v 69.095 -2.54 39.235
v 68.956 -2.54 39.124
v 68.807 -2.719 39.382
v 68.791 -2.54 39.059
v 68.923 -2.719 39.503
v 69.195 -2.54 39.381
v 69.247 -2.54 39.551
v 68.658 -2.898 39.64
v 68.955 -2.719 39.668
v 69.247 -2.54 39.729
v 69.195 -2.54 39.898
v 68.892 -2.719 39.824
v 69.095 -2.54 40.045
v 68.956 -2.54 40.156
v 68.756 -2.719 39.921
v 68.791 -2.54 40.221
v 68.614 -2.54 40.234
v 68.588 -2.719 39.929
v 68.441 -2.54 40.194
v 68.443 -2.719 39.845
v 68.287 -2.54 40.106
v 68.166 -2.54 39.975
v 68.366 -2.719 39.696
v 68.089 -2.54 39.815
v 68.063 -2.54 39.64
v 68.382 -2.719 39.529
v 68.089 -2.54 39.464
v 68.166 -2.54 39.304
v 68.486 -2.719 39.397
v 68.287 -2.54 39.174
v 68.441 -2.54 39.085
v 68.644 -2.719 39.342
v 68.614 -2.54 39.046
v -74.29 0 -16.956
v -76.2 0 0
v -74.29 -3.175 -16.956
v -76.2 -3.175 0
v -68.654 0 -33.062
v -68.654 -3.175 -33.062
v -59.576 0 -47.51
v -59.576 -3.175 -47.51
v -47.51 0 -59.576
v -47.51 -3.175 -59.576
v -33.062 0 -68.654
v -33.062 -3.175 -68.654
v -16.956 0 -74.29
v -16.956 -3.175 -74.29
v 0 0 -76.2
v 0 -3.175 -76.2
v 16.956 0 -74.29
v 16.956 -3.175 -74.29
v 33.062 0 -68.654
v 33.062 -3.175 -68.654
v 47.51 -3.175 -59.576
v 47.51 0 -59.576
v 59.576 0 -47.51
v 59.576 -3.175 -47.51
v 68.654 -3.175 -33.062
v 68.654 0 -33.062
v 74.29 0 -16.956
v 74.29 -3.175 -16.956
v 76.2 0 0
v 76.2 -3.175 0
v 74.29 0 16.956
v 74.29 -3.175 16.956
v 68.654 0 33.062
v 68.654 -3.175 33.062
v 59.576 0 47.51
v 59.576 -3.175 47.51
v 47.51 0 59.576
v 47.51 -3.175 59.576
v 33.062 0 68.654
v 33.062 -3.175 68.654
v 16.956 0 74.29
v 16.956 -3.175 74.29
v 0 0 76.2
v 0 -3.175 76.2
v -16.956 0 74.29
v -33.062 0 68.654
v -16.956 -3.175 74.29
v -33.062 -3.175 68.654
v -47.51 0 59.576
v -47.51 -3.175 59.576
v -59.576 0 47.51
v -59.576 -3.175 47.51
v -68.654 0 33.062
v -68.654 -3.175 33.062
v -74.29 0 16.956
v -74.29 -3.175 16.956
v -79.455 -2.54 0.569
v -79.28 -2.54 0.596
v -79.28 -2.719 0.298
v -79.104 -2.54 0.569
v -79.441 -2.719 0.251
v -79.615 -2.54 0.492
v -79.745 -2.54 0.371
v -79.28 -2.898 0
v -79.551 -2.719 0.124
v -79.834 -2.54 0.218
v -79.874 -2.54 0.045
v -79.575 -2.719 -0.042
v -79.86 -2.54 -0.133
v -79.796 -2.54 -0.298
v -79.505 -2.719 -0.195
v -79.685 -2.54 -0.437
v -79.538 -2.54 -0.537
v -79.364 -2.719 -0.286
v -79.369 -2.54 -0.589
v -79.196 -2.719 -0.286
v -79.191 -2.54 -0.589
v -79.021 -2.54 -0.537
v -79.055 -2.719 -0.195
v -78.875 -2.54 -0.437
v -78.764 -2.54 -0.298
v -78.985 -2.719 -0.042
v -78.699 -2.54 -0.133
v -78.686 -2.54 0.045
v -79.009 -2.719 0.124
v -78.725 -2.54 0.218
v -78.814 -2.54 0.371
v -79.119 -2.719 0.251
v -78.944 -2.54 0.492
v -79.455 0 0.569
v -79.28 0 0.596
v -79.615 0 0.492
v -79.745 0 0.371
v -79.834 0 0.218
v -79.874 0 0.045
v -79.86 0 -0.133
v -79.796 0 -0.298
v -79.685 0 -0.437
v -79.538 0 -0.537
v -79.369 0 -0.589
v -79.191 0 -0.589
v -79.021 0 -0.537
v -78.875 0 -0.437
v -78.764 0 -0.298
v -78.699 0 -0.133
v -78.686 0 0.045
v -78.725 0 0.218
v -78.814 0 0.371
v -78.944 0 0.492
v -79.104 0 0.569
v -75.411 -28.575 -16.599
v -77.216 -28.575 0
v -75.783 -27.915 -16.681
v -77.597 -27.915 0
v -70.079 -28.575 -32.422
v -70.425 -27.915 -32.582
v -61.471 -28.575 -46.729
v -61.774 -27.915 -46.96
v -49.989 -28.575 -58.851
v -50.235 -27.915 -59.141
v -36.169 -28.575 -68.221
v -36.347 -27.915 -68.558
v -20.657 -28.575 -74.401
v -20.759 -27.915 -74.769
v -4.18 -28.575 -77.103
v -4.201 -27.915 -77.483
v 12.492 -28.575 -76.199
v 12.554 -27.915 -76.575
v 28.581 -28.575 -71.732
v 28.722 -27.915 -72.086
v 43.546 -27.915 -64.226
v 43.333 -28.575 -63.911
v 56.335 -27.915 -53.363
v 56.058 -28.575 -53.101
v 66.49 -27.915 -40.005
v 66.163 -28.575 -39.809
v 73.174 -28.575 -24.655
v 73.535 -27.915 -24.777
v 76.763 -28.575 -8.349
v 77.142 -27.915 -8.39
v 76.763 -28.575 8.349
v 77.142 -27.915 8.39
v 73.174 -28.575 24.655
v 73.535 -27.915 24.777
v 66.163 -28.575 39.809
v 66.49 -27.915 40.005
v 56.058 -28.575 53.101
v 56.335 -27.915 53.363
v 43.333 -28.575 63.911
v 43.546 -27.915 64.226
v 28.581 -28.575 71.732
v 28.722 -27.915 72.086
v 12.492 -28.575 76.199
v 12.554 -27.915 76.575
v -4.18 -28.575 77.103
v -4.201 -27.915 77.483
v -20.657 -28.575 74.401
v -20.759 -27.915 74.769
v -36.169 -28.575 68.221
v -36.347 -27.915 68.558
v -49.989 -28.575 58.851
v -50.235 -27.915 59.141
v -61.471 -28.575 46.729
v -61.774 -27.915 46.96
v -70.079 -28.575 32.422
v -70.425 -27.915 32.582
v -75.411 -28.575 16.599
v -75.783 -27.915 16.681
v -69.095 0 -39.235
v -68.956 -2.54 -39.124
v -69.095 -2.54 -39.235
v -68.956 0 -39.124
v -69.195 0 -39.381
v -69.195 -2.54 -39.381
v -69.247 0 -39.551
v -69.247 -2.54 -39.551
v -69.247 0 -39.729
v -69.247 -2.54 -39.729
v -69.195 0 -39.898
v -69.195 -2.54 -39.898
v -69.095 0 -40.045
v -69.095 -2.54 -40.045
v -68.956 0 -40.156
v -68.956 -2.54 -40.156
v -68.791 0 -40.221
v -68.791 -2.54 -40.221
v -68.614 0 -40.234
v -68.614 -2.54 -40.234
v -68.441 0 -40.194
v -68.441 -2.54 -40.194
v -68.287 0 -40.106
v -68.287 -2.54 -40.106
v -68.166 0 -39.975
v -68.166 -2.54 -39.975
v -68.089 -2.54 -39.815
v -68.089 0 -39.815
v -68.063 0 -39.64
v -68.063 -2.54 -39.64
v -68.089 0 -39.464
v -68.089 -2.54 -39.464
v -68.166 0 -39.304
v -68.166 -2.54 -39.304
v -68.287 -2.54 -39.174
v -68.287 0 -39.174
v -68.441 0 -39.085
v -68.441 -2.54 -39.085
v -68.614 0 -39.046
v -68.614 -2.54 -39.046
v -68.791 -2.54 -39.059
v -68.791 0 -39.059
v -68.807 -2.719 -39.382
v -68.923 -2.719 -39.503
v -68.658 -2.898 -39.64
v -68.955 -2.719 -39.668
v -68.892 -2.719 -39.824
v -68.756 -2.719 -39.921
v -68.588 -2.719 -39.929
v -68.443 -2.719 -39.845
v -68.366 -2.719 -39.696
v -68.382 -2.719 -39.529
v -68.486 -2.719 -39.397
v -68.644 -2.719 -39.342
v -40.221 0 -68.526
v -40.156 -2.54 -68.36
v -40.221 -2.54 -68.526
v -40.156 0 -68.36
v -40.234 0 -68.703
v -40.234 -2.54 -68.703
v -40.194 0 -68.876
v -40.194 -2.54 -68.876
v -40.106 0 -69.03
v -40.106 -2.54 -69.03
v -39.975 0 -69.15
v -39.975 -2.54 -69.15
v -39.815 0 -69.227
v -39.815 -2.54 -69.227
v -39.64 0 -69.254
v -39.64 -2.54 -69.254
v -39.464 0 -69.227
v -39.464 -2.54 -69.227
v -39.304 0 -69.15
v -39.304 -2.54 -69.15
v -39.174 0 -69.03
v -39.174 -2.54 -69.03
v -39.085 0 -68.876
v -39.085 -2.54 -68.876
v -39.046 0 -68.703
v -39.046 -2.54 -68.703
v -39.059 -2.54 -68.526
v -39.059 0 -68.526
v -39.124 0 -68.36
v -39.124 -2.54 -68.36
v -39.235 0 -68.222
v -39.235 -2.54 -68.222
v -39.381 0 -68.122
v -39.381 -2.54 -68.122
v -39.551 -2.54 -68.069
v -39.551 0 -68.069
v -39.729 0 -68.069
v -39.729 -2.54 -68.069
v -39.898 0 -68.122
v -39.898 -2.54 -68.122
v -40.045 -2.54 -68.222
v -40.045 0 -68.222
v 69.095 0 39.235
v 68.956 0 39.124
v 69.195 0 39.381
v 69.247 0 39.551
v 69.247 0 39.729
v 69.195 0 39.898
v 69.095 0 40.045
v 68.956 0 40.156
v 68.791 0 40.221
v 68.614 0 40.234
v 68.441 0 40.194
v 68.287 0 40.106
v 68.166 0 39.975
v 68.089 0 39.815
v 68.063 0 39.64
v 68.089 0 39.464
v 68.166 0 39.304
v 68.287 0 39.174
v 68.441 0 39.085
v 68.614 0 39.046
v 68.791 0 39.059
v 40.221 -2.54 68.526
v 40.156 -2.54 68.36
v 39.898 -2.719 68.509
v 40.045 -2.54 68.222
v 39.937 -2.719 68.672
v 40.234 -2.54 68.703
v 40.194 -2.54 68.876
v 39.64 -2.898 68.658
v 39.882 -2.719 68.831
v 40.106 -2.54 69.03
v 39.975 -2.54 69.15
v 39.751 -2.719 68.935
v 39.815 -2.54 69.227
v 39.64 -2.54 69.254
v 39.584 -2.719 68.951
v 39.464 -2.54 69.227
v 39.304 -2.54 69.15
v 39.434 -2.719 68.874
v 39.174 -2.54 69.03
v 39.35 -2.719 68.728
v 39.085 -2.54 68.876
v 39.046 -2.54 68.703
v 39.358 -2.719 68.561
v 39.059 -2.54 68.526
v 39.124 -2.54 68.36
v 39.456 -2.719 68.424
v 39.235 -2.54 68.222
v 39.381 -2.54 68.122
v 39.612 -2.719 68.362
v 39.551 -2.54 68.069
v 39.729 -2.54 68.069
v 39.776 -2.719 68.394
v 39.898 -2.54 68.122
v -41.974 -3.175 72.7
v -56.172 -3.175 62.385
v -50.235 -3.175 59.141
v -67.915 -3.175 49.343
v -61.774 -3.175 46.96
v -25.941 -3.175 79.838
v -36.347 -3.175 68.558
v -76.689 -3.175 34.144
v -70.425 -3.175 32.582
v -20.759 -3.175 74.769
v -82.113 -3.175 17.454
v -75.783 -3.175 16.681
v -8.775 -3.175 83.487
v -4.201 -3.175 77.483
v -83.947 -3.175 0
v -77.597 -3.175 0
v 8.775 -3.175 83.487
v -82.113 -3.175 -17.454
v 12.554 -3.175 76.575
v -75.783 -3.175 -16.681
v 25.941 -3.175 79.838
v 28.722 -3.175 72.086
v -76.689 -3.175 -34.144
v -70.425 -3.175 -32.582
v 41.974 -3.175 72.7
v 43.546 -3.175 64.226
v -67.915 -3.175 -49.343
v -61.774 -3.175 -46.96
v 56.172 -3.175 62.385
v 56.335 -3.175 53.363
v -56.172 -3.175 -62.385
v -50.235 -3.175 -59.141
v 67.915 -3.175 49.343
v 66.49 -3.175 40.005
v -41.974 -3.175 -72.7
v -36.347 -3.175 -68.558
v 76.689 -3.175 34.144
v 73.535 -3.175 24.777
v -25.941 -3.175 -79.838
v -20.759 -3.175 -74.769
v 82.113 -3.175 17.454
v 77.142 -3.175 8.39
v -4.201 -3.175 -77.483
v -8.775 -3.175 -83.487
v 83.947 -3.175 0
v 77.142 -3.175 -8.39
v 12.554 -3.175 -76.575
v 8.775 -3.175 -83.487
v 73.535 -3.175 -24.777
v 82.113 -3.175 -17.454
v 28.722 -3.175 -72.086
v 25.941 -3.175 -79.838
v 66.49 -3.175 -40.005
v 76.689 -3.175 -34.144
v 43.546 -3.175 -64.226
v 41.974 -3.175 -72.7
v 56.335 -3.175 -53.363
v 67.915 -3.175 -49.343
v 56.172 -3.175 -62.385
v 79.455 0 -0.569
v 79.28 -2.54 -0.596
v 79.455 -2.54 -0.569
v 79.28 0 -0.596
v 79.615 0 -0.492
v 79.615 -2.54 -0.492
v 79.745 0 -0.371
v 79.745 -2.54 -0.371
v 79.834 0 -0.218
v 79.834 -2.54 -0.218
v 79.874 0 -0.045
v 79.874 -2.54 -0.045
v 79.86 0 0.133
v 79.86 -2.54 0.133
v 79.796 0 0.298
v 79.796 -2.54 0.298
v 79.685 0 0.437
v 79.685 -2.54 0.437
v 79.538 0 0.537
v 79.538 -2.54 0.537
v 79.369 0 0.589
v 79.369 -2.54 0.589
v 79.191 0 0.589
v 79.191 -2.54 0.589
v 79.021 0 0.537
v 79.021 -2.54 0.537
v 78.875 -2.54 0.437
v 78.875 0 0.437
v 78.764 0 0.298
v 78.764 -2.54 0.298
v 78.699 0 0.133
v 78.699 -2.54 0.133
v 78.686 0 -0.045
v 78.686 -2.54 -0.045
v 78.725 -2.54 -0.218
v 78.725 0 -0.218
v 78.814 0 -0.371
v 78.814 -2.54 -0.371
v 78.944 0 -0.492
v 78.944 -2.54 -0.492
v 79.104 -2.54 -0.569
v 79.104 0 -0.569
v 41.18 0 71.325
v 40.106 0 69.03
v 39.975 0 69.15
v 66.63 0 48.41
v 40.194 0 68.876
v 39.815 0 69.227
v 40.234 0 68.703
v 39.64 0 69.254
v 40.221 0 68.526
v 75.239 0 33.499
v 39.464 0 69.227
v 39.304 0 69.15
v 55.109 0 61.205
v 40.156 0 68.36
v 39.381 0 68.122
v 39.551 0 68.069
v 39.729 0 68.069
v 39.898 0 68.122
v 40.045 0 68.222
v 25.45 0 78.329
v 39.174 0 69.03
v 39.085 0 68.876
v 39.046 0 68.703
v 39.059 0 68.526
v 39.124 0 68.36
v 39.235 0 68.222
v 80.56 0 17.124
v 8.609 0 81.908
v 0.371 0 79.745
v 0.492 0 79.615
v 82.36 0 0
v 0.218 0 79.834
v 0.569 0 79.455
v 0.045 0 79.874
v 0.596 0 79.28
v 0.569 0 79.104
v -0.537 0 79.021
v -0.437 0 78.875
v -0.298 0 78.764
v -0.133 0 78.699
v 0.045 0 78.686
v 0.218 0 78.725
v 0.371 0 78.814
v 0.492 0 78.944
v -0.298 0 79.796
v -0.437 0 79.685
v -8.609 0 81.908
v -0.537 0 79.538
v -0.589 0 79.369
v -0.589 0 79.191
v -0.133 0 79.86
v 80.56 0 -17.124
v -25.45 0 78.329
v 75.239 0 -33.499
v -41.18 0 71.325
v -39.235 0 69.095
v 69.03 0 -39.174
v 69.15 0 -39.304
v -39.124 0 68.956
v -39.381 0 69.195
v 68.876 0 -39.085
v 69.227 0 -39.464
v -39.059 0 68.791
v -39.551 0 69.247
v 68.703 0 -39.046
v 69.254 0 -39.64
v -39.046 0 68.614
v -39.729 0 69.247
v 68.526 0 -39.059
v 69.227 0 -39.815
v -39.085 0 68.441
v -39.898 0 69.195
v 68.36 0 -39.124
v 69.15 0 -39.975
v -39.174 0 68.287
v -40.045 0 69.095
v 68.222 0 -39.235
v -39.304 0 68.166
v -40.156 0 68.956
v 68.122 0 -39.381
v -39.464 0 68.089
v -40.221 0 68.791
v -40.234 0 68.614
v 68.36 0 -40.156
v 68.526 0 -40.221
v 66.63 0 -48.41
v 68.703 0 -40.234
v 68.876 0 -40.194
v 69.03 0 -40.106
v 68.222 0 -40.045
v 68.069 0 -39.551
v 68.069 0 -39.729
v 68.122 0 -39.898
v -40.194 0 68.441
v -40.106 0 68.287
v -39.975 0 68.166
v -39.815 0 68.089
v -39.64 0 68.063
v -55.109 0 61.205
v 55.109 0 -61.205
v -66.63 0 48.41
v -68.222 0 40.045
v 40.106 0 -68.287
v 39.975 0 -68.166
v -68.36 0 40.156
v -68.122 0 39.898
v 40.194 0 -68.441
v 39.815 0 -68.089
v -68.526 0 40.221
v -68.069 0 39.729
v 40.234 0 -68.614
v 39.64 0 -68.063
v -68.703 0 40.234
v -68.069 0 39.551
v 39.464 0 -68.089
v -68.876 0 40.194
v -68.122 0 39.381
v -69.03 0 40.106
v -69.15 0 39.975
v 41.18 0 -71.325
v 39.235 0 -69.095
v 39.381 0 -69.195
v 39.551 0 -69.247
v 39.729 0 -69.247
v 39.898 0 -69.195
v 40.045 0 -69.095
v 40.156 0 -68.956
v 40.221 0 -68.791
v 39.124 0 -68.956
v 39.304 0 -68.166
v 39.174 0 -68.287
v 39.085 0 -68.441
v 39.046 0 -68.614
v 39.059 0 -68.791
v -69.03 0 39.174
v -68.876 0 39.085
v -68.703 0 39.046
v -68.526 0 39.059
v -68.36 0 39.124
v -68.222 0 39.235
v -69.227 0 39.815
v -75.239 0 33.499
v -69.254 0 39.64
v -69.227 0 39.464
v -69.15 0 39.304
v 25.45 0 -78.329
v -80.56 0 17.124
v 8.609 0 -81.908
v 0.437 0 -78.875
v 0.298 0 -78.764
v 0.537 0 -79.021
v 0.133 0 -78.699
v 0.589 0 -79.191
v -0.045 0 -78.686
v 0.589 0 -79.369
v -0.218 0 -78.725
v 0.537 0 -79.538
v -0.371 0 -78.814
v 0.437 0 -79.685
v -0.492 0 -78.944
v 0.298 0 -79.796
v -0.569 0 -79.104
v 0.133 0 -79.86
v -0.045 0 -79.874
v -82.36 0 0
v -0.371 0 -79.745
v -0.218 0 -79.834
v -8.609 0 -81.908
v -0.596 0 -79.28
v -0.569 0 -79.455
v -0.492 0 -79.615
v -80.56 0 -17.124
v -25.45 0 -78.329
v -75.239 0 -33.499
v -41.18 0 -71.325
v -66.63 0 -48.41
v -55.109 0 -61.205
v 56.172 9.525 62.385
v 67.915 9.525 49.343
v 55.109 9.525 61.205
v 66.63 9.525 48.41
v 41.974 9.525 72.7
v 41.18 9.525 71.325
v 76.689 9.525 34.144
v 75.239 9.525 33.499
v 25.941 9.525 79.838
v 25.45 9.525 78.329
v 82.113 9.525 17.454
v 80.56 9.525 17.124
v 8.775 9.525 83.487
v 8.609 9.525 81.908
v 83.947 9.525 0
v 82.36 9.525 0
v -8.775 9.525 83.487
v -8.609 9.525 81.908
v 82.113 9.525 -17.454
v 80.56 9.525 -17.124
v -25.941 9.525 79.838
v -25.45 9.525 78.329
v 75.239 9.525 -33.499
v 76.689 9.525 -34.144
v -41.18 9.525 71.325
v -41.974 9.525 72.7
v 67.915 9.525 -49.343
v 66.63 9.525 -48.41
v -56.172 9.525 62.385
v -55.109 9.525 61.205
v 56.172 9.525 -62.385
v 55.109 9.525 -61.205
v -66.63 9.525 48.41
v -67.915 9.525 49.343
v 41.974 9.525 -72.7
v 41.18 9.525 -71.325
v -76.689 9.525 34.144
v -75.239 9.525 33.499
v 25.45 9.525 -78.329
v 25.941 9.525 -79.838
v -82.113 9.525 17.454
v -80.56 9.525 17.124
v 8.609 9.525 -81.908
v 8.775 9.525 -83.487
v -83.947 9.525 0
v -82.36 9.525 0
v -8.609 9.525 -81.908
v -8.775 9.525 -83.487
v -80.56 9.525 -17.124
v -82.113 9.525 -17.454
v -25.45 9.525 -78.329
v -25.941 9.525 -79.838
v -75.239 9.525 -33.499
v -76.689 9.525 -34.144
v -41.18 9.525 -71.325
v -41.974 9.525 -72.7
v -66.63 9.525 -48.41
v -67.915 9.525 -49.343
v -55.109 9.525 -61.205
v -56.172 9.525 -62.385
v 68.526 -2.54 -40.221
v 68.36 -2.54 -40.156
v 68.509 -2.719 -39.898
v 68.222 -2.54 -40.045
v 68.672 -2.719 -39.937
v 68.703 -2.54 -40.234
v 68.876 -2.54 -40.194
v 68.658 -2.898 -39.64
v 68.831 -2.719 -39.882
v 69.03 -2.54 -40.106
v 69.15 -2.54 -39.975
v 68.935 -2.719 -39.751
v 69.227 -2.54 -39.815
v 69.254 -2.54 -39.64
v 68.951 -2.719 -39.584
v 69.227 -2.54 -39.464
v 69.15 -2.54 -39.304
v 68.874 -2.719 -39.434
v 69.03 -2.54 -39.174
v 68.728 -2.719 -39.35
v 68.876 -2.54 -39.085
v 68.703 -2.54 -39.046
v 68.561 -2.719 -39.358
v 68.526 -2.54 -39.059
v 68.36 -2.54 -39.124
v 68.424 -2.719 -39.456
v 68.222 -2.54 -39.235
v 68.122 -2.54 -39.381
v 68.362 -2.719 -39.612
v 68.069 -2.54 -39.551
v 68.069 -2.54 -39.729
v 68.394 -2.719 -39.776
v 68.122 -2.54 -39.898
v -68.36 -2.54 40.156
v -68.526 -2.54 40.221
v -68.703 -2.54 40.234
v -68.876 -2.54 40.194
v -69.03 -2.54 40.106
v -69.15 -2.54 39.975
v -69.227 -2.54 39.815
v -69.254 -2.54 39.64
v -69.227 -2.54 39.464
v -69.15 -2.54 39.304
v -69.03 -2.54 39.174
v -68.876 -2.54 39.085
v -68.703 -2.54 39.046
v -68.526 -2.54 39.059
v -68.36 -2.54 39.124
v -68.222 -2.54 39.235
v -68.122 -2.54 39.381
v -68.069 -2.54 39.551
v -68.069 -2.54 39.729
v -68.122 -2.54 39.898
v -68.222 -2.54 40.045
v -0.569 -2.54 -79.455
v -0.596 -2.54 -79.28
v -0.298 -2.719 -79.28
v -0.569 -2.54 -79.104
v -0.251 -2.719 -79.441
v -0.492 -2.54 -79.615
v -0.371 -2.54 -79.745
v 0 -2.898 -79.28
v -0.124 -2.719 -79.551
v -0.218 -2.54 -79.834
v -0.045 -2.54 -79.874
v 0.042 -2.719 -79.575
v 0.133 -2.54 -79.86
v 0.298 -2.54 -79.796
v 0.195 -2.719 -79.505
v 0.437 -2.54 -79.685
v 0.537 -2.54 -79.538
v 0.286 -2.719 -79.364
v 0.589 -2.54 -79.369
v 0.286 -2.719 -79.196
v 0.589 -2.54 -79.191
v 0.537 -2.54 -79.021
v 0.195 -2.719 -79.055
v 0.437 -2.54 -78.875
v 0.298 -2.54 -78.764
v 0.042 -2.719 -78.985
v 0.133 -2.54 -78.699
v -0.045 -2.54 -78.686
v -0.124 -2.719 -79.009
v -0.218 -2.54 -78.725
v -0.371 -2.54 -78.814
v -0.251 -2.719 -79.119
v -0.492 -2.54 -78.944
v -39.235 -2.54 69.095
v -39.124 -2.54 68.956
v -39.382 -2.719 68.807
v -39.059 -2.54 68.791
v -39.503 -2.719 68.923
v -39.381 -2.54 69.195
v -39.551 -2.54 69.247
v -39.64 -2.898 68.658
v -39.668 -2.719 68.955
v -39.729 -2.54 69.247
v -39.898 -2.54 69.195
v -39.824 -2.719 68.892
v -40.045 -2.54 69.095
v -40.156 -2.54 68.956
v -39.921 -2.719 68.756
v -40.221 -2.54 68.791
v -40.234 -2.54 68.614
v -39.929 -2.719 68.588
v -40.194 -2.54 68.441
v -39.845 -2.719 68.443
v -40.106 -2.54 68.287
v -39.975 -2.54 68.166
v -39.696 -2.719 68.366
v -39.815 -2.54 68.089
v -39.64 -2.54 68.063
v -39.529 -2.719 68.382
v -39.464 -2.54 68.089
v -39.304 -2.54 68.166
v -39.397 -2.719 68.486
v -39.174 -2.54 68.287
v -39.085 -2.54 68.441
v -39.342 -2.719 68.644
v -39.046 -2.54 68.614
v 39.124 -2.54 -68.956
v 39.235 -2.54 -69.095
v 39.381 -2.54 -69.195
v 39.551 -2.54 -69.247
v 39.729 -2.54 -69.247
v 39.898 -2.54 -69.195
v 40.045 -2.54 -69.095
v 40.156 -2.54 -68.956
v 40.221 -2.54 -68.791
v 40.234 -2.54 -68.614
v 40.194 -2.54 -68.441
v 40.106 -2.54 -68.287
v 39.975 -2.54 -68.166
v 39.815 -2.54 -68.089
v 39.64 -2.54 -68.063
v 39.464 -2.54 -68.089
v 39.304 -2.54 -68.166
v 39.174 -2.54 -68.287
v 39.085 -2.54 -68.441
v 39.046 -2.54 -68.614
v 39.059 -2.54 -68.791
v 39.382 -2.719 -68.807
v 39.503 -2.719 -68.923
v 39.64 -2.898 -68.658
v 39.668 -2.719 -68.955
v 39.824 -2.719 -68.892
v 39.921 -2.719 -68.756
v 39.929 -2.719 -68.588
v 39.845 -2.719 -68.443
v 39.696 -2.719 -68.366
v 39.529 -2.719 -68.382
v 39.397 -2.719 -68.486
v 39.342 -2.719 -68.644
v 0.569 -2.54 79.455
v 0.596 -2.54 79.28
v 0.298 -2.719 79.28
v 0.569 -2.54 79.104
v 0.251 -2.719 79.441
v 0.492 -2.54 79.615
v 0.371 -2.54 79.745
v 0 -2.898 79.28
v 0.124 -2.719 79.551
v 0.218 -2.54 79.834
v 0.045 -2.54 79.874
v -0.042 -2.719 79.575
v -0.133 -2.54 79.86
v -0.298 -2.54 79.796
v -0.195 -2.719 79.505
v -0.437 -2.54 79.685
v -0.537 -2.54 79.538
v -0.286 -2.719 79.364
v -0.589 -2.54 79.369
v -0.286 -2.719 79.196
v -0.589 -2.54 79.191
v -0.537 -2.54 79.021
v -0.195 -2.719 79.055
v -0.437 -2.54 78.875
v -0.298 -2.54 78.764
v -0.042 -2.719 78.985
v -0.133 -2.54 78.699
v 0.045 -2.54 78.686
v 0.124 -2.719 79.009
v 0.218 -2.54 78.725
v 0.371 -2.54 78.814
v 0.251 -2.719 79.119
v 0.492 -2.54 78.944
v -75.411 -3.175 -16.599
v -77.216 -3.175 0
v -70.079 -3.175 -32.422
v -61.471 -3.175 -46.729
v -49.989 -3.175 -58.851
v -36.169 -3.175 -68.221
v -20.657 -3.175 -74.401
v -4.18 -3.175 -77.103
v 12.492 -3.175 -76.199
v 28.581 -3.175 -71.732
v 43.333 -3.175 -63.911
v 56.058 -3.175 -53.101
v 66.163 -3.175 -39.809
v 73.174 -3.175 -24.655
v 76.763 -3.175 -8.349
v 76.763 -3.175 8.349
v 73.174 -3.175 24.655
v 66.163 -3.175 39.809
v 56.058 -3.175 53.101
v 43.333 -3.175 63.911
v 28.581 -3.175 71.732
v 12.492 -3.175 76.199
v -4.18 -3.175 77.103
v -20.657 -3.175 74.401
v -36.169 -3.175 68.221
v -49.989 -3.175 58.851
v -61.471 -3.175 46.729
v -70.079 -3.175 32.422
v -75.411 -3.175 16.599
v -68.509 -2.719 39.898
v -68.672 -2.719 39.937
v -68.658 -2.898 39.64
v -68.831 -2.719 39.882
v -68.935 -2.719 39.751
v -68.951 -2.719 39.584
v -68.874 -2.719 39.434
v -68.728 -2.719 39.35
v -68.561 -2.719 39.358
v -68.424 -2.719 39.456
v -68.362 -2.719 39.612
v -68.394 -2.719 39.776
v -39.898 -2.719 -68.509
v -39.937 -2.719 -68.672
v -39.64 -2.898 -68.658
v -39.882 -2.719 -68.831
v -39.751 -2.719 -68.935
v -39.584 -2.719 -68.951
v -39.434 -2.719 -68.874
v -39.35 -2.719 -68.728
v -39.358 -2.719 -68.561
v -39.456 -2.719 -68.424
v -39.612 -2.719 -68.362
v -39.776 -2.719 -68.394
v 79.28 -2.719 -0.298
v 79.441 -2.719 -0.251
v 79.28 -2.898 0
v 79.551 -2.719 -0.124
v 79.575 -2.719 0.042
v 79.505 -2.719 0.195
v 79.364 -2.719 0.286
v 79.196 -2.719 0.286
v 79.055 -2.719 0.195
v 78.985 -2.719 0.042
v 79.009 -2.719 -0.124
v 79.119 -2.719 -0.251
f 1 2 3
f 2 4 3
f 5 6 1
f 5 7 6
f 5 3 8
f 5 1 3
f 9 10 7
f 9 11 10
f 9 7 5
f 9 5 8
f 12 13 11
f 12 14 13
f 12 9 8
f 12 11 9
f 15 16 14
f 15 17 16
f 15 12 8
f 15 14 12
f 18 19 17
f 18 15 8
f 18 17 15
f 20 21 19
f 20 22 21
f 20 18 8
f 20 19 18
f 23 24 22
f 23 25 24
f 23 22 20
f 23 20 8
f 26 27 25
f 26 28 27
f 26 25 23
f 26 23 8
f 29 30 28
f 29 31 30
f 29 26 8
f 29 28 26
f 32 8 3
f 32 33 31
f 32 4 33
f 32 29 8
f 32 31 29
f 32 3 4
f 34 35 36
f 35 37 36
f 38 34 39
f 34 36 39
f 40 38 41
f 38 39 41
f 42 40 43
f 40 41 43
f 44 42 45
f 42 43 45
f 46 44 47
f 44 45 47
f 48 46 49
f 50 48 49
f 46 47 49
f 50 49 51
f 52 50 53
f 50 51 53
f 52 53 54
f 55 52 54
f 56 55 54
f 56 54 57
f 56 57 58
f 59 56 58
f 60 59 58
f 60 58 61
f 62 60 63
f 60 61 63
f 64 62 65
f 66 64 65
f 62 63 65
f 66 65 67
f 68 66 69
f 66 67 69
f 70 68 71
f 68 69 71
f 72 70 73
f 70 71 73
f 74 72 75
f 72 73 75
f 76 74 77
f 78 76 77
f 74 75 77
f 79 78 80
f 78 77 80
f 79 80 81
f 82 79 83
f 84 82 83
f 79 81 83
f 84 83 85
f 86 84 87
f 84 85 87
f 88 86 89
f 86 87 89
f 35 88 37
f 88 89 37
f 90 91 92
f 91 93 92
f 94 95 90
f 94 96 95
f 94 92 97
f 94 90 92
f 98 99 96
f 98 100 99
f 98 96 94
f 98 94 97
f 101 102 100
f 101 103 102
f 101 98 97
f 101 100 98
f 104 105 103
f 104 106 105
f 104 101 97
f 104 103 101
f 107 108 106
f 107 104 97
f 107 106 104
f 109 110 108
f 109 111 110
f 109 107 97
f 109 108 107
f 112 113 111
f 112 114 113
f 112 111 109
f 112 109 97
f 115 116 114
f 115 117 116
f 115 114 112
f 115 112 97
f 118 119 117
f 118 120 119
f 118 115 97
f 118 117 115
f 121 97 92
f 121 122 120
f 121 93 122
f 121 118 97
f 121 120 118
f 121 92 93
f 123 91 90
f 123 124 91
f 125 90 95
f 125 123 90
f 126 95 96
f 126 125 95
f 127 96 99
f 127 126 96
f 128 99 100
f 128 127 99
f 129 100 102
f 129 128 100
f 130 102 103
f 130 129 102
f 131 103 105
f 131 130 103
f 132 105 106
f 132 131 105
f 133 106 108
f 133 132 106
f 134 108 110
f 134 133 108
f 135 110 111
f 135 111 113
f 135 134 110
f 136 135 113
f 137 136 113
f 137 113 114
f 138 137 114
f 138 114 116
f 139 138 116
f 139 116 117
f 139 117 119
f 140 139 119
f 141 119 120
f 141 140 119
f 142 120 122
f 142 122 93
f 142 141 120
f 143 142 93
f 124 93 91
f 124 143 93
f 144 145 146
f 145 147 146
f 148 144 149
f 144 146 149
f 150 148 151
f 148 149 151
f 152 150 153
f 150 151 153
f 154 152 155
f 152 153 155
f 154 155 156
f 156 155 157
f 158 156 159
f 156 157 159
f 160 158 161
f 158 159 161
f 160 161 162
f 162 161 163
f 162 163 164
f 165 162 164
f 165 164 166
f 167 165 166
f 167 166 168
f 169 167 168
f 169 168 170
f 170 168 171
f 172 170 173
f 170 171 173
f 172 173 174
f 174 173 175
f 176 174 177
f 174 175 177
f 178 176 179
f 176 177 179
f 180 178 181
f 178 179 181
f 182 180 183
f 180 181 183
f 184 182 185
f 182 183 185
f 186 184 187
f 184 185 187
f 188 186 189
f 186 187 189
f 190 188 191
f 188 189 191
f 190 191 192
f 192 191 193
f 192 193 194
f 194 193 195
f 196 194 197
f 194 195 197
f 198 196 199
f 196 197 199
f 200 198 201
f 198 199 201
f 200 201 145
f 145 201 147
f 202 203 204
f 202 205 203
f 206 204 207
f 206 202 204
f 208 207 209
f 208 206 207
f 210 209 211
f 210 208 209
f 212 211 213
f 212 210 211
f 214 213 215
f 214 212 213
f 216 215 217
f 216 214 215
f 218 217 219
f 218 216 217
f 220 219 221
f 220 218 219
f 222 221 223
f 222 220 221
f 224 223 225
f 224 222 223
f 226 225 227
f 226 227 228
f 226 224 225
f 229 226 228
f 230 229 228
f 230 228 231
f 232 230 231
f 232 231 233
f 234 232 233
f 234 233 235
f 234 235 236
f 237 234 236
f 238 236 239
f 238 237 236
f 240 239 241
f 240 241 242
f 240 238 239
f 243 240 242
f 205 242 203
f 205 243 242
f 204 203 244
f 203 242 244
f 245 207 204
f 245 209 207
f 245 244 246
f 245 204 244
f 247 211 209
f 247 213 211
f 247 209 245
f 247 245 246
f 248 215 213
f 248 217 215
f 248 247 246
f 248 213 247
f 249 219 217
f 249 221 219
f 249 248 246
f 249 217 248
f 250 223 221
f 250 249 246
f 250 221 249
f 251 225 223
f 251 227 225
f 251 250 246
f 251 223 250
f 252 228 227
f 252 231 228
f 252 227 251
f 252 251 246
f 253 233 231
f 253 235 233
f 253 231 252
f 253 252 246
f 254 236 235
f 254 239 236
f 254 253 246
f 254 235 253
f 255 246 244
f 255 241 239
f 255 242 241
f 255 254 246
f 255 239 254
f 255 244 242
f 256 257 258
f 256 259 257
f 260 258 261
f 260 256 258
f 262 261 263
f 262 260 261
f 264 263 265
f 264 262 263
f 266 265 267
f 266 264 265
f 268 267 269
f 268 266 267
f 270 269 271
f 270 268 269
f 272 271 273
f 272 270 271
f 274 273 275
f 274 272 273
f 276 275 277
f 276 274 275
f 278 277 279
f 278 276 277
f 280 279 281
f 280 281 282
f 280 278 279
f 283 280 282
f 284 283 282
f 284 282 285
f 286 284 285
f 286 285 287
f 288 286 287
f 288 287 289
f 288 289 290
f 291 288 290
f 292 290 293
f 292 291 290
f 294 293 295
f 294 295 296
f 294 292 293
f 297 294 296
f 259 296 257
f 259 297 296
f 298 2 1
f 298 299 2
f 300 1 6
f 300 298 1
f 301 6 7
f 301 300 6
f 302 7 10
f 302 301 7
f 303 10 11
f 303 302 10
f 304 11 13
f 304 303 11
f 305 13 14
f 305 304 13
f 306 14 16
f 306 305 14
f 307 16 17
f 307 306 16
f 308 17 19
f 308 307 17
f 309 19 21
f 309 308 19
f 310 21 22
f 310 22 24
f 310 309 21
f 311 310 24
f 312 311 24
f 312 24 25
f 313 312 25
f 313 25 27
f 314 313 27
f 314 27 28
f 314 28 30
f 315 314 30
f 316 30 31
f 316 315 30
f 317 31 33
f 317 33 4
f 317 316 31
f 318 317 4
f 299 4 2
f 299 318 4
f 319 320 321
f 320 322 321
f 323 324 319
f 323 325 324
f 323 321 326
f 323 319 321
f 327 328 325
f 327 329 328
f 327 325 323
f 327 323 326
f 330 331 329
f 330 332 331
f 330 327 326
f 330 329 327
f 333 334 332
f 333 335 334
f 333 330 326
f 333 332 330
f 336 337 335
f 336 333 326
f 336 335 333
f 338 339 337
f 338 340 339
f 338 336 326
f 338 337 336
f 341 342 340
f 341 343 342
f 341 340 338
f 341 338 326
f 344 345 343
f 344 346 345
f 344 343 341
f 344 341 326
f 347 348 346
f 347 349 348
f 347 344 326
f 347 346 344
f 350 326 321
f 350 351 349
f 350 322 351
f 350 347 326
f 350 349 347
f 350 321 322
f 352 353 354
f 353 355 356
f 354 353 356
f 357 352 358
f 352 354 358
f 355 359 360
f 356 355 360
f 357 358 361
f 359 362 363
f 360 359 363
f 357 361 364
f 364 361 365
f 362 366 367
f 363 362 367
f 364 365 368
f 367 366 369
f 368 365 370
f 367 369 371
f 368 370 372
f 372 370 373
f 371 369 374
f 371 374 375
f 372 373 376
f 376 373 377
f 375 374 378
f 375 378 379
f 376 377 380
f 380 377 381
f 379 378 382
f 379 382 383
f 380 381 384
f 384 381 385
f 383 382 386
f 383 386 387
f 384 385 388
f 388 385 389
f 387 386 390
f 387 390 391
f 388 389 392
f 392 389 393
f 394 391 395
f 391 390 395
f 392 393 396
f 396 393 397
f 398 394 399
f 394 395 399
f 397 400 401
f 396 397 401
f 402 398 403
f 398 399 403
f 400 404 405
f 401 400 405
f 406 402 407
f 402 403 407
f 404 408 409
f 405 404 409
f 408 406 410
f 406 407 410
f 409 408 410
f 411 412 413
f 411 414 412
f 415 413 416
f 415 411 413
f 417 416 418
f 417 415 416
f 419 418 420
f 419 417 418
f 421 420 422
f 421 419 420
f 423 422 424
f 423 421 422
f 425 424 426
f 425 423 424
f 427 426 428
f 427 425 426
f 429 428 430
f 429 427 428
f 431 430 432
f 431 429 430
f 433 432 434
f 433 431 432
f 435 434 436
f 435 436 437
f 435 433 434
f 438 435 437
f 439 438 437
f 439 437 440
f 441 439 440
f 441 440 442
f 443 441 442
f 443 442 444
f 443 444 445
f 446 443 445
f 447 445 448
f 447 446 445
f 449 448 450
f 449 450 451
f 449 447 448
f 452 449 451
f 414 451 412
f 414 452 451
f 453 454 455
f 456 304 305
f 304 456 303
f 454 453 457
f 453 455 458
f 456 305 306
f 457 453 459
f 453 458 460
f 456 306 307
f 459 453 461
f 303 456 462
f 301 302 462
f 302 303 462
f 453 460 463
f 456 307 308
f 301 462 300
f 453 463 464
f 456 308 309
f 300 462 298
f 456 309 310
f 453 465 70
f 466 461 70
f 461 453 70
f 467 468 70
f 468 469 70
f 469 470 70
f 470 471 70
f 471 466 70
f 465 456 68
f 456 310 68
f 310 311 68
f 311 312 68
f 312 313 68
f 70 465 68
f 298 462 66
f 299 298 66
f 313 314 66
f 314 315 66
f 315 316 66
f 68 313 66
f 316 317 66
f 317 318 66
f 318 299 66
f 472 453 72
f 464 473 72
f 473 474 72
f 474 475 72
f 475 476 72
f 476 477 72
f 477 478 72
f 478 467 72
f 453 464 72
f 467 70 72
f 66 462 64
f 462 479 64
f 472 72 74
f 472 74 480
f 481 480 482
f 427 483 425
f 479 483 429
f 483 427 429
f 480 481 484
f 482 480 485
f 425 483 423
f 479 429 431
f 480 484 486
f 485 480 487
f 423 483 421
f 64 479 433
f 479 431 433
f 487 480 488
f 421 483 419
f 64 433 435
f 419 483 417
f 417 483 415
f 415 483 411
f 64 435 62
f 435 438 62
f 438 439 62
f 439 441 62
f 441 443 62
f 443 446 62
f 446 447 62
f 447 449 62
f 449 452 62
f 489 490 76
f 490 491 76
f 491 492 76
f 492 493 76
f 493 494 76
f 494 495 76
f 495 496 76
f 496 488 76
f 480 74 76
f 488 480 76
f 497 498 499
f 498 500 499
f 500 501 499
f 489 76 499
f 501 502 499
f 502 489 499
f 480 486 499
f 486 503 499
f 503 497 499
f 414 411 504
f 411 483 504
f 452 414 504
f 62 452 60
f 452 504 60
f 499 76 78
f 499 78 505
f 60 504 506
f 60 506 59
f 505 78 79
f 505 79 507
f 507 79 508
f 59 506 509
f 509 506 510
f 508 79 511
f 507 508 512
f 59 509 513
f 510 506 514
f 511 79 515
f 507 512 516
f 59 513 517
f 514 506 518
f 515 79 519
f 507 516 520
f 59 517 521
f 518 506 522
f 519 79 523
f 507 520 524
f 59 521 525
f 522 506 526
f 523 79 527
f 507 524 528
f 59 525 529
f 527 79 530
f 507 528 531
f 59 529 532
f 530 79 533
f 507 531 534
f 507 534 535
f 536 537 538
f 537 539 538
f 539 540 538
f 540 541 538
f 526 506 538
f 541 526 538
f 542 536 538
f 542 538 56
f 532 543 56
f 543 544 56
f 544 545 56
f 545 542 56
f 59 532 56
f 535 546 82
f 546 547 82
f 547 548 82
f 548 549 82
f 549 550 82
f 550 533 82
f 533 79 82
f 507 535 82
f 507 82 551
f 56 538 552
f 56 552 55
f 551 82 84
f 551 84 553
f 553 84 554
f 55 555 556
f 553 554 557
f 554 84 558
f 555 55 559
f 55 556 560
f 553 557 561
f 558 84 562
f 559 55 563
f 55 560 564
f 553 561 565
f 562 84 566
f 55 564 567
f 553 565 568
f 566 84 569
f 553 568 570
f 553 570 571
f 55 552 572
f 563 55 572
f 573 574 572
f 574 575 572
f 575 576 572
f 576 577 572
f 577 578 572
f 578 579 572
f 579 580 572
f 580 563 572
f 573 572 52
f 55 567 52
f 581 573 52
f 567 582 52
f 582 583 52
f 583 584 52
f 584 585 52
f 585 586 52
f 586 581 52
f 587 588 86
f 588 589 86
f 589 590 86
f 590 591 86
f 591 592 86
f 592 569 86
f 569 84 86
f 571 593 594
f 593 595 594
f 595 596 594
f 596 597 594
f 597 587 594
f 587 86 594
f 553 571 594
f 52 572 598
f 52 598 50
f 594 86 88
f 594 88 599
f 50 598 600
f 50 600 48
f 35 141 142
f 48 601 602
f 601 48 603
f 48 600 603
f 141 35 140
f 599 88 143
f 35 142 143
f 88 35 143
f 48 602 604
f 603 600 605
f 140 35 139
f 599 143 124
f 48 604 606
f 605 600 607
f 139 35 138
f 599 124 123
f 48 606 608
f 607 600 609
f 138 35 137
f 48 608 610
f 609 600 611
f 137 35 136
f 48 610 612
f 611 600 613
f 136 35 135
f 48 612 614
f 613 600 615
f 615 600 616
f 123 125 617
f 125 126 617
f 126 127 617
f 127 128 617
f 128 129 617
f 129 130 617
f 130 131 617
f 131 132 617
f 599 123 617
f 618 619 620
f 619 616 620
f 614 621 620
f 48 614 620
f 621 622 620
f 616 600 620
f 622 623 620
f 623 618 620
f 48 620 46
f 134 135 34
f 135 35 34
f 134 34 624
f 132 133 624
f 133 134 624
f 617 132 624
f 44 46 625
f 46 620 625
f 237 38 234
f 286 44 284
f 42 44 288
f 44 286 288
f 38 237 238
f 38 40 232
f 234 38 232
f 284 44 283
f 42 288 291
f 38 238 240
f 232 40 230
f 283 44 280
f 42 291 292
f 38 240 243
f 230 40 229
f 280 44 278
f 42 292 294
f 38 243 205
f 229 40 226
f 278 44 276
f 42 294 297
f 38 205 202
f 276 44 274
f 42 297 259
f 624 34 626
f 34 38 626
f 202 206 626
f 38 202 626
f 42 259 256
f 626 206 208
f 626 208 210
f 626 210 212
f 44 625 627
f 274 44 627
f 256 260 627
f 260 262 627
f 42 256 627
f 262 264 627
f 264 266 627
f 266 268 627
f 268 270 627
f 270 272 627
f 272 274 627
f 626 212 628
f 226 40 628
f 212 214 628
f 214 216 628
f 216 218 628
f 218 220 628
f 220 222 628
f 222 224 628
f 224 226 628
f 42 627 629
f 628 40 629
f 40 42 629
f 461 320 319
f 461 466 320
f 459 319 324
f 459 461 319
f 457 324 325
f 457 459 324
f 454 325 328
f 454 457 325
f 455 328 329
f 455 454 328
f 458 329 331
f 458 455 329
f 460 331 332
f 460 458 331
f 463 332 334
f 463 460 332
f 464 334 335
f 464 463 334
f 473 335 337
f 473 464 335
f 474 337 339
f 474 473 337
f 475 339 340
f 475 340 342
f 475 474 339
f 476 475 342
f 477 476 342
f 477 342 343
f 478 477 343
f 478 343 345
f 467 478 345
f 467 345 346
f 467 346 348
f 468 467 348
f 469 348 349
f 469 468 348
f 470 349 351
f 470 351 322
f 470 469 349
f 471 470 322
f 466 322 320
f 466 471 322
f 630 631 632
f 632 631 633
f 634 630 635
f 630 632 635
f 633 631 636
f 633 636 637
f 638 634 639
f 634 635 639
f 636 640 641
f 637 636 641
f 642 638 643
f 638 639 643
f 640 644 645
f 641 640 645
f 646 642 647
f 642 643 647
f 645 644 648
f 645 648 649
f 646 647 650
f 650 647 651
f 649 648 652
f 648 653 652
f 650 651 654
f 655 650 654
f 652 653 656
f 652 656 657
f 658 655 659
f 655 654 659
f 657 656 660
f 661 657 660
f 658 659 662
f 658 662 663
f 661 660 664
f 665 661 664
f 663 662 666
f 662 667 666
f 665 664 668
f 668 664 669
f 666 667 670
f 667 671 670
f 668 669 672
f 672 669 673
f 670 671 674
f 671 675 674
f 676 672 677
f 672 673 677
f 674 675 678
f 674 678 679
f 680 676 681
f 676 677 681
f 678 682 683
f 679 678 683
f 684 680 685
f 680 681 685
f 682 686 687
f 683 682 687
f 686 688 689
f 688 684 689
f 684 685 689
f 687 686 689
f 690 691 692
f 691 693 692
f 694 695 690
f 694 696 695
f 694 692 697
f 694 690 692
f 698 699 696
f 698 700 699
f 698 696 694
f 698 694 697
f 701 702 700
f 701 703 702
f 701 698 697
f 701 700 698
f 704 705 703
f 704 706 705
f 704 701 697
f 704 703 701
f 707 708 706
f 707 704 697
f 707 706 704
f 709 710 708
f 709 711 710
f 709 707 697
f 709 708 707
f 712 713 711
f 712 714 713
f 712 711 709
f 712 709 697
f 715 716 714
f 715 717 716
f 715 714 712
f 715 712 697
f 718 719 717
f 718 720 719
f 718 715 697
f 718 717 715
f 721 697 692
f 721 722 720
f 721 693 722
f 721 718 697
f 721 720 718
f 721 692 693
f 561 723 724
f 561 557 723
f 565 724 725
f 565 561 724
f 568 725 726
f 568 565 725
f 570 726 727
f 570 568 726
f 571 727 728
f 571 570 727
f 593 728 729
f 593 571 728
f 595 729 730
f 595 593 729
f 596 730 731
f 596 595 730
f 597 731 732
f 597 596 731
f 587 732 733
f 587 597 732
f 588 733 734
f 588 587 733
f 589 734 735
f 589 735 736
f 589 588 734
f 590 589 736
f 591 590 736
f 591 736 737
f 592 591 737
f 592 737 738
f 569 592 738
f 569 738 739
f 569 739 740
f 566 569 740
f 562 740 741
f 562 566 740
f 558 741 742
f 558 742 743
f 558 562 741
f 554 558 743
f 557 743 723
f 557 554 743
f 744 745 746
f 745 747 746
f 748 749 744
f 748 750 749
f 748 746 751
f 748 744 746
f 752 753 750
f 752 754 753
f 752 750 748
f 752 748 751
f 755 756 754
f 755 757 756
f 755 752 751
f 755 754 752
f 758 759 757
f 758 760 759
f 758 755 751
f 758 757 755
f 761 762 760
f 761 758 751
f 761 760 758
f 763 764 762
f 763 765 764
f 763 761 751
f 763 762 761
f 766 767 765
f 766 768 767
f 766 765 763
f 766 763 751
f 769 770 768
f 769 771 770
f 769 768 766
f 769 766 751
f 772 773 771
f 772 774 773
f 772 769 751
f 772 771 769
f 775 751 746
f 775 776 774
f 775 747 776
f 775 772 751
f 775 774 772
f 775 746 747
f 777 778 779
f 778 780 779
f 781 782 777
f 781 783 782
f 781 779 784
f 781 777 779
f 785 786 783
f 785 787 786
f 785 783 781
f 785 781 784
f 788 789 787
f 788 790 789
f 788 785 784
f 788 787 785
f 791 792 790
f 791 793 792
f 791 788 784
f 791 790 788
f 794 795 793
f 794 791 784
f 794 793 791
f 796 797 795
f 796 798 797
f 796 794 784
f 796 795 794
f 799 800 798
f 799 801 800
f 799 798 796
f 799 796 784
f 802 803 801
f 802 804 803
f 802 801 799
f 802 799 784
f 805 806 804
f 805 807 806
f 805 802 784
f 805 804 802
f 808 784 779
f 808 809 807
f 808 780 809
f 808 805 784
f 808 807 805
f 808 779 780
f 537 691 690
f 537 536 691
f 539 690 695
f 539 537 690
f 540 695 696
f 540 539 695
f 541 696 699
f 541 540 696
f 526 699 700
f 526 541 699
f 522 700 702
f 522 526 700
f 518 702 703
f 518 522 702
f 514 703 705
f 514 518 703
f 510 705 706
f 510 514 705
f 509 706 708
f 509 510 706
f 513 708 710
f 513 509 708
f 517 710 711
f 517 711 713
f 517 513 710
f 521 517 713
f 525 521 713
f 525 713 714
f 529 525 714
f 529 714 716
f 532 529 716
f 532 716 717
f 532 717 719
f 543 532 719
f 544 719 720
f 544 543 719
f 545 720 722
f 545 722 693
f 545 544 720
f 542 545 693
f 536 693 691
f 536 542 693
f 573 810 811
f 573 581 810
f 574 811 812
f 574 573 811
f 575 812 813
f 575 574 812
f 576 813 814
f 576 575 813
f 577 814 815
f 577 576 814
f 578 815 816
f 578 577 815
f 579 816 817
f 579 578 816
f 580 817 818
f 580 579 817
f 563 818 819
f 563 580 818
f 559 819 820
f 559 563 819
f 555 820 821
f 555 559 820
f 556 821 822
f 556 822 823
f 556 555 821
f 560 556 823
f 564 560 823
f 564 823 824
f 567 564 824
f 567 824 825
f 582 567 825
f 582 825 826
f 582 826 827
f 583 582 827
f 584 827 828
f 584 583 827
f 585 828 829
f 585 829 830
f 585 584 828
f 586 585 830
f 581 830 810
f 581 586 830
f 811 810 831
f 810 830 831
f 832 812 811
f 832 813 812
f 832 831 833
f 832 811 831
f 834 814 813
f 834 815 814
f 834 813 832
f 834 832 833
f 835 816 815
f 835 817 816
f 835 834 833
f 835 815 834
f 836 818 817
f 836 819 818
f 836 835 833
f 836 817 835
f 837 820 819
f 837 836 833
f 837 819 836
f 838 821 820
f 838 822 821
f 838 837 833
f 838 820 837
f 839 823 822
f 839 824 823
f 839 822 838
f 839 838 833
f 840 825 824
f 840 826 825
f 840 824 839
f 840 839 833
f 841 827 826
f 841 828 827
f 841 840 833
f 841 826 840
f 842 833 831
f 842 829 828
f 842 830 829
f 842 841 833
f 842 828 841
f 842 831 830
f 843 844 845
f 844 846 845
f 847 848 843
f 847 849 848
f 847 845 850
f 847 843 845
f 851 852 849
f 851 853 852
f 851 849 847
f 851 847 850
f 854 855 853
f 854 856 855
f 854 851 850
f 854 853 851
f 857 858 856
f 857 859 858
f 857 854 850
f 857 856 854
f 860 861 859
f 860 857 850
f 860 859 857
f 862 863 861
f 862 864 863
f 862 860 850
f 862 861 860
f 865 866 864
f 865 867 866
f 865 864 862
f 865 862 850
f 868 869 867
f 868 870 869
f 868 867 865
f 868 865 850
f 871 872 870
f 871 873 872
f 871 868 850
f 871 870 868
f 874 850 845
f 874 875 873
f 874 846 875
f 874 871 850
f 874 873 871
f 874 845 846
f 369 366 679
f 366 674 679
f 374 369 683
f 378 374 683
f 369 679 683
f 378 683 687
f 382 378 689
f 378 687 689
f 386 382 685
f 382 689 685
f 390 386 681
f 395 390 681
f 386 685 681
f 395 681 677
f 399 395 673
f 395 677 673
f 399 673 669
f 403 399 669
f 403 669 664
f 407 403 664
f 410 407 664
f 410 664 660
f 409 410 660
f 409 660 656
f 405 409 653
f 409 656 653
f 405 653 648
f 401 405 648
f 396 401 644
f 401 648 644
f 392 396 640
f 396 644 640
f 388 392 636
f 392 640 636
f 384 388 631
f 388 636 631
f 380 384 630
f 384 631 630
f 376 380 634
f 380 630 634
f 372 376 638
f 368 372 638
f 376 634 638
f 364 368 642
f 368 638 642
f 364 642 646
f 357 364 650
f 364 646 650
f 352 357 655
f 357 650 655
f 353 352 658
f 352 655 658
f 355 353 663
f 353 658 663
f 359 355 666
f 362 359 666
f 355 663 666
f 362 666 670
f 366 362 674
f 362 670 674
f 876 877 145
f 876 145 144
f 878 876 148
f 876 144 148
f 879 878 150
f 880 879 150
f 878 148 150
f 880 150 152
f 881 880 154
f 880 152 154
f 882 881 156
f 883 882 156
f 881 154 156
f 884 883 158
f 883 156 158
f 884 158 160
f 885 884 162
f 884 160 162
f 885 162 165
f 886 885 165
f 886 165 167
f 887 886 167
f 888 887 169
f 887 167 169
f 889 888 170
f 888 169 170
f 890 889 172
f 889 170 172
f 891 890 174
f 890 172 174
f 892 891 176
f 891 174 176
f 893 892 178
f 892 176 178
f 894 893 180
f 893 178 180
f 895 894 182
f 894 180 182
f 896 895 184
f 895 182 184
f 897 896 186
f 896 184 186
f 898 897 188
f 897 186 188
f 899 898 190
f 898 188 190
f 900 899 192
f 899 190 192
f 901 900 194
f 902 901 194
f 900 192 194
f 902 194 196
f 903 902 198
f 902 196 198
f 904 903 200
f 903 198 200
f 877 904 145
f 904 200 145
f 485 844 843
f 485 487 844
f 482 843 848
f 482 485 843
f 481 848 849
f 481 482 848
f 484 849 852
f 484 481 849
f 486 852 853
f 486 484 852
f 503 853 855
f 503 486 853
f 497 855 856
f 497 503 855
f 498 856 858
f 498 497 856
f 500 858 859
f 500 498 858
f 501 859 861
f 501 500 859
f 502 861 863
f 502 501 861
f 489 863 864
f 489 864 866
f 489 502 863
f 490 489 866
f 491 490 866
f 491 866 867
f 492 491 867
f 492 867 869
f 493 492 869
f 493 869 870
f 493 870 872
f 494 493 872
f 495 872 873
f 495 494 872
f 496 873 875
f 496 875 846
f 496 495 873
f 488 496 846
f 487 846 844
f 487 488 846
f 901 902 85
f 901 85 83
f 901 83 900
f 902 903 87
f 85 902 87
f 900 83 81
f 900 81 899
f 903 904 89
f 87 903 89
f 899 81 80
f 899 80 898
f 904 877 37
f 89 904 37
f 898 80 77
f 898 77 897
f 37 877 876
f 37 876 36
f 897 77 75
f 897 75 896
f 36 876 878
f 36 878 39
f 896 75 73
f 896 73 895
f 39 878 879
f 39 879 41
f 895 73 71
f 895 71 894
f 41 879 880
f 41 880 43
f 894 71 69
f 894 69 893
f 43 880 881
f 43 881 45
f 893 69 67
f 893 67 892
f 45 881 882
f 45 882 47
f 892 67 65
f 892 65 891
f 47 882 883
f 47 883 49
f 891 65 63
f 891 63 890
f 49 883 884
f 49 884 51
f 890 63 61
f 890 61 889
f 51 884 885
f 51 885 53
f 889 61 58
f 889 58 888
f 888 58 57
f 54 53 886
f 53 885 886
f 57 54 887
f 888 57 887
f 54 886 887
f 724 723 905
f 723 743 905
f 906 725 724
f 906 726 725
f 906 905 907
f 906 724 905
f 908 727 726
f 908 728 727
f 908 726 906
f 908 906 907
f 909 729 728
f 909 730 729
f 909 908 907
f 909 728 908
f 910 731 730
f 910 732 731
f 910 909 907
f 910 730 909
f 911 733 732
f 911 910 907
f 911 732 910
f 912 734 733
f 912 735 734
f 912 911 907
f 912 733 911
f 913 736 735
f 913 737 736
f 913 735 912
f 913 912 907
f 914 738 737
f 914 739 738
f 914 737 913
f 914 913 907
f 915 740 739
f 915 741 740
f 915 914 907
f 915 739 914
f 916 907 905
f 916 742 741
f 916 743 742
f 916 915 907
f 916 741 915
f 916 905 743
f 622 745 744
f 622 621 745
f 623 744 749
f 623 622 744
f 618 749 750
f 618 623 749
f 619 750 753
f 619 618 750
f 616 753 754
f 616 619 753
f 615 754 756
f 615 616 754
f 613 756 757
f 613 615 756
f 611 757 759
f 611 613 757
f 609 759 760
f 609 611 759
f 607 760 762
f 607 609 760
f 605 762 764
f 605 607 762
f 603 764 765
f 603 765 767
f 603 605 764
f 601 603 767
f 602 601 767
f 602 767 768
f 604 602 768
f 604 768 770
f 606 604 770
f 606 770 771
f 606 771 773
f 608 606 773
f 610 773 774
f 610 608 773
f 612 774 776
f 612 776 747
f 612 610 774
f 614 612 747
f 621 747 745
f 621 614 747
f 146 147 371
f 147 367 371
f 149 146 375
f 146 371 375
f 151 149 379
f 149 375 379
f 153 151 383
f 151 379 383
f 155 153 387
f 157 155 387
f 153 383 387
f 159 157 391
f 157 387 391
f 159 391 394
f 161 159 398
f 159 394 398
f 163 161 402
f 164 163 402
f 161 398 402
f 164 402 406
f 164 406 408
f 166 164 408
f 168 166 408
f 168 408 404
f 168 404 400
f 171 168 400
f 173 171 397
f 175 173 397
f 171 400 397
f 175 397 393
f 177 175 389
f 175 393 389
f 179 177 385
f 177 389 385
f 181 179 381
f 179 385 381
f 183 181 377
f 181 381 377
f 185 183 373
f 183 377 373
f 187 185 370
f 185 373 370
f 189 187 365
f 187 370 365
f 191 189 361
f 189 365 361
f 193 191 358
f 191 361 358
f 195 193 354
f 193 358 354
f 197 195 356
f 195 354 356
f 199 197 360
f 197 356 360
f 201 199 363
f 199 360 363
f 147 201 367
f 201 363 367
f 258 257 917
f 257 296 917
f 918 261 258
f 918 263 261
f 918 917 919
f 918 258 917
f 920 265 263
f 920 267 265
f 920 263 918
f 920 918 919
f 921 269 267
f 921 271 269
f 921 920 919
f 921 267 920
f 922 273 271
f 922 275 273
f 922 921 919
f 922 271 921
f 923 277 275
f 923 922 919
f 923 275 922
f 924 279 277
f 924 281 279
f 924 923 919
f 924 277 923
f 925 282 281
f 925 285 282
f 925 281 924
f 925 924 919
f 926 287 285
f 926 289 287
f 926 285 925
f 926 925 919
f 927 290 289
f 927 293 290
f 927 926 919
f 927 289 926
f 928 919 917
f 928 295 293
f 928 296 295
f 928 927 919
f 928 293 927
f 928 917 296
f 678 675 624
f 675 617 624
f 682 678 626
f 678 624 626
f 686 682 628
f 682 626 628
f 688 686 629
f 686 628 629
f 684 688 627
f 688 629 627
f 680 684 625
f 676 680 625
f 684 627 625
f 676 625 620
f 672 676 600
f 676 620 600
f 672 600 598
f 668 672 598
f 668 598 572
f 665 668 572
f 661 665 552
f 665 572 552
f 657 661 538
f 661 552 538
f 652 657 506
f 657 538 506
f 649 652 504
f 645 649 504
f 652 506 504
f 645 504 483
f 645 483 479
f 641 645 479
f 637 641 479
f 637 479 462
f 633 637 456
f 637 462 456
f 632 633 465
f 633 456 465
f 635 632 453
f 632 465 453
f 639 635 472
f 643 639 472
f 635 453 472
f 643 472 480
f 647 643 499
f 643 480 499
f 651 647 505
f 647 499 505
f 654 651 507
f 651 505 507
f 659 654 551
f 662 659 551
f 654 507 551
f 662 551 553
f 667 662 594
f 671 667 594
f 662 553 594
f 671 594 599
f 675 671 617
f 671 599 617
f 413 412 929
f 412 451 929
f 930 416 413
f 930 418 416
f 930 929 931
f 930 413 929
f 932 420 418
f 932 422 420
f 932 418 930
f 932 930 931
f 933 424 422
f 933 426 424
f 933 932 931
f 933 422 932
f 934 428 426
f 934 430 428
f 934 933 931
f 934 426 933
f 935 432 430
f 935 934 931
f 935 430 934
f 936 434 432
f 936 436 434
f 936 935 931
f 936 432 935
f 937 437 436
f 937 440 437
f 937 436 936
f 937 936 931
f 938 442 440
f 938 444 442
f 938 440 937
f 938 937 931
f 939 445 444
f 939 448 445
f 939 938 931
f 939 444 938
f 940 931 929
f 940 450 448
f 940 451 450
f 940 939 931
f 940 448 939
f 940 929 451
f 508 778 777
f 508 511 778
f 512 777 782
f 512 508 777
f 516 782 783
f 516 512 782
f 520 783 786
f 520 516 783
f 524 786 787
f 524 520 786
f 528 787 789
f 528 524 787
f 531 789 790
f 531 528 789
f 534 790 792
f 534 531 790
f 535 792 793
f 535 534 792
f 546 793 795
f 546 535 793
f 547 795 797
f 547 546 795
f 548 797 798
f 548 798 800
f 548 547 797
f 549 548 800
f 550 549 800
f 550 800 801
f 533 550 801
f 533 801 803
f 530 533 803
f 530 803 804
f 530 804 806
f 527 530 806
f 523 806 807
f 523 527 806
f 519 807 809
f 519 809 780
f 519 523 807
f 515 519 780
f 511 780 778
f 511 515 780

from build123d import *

# Parameters (mm, degrees)
SCREW_HOLES_COUNT = 12


with BuildPart() as part:
    # Cross Section → Main (revolve)
    with BuildSketch(Plane.XY):
        Polygon((-76.2, 0), (-76.2, -3.175), (-77.216, -3.175), (-77.216, -28.575), (-77.597, -27.915088642), (-77.597, -3.175), (-83.947, -3.175), (-83.947, 9.525), (-82.3595, 9.525), (-82.3595, 0), align=None)
    revolve(axis=Axis((0, 55, 0), (0, -1, 0)))

    # Sketch7 → #0-80 Tapped Hole1 (revolve, cut)
    with BuildSketch(Plane(origin=(-79.27975, 0, 0), x_dir=(0, 0, 1), z_dir=(1, 0, 0))):
        Polygon((0, 0), (0, 2.897890611), (0.59563, 2.54), (0.59563, 0), align=None)
    f_0_80_tapped_hole1 = revolve(axis=Axis((-79.27975, 6.35, 0), (0, -1, 0)), mode=Mode.SUBTRACT)

    # Screw Holes: #0-80 Tapped Hole1 ×12 about axis
    screw_holes_axis = Axis((0, 0, 0), (0, 1, 0))
    for i in range(1, SCREW_HOLES_COUNT):
        add(f_0_80_tapped_hole1.rotate(screw_holes_axis, i * 360 / SCREW_HOLES_COUNT), mode=Mode.SUBTRACT)


solid = part.part
